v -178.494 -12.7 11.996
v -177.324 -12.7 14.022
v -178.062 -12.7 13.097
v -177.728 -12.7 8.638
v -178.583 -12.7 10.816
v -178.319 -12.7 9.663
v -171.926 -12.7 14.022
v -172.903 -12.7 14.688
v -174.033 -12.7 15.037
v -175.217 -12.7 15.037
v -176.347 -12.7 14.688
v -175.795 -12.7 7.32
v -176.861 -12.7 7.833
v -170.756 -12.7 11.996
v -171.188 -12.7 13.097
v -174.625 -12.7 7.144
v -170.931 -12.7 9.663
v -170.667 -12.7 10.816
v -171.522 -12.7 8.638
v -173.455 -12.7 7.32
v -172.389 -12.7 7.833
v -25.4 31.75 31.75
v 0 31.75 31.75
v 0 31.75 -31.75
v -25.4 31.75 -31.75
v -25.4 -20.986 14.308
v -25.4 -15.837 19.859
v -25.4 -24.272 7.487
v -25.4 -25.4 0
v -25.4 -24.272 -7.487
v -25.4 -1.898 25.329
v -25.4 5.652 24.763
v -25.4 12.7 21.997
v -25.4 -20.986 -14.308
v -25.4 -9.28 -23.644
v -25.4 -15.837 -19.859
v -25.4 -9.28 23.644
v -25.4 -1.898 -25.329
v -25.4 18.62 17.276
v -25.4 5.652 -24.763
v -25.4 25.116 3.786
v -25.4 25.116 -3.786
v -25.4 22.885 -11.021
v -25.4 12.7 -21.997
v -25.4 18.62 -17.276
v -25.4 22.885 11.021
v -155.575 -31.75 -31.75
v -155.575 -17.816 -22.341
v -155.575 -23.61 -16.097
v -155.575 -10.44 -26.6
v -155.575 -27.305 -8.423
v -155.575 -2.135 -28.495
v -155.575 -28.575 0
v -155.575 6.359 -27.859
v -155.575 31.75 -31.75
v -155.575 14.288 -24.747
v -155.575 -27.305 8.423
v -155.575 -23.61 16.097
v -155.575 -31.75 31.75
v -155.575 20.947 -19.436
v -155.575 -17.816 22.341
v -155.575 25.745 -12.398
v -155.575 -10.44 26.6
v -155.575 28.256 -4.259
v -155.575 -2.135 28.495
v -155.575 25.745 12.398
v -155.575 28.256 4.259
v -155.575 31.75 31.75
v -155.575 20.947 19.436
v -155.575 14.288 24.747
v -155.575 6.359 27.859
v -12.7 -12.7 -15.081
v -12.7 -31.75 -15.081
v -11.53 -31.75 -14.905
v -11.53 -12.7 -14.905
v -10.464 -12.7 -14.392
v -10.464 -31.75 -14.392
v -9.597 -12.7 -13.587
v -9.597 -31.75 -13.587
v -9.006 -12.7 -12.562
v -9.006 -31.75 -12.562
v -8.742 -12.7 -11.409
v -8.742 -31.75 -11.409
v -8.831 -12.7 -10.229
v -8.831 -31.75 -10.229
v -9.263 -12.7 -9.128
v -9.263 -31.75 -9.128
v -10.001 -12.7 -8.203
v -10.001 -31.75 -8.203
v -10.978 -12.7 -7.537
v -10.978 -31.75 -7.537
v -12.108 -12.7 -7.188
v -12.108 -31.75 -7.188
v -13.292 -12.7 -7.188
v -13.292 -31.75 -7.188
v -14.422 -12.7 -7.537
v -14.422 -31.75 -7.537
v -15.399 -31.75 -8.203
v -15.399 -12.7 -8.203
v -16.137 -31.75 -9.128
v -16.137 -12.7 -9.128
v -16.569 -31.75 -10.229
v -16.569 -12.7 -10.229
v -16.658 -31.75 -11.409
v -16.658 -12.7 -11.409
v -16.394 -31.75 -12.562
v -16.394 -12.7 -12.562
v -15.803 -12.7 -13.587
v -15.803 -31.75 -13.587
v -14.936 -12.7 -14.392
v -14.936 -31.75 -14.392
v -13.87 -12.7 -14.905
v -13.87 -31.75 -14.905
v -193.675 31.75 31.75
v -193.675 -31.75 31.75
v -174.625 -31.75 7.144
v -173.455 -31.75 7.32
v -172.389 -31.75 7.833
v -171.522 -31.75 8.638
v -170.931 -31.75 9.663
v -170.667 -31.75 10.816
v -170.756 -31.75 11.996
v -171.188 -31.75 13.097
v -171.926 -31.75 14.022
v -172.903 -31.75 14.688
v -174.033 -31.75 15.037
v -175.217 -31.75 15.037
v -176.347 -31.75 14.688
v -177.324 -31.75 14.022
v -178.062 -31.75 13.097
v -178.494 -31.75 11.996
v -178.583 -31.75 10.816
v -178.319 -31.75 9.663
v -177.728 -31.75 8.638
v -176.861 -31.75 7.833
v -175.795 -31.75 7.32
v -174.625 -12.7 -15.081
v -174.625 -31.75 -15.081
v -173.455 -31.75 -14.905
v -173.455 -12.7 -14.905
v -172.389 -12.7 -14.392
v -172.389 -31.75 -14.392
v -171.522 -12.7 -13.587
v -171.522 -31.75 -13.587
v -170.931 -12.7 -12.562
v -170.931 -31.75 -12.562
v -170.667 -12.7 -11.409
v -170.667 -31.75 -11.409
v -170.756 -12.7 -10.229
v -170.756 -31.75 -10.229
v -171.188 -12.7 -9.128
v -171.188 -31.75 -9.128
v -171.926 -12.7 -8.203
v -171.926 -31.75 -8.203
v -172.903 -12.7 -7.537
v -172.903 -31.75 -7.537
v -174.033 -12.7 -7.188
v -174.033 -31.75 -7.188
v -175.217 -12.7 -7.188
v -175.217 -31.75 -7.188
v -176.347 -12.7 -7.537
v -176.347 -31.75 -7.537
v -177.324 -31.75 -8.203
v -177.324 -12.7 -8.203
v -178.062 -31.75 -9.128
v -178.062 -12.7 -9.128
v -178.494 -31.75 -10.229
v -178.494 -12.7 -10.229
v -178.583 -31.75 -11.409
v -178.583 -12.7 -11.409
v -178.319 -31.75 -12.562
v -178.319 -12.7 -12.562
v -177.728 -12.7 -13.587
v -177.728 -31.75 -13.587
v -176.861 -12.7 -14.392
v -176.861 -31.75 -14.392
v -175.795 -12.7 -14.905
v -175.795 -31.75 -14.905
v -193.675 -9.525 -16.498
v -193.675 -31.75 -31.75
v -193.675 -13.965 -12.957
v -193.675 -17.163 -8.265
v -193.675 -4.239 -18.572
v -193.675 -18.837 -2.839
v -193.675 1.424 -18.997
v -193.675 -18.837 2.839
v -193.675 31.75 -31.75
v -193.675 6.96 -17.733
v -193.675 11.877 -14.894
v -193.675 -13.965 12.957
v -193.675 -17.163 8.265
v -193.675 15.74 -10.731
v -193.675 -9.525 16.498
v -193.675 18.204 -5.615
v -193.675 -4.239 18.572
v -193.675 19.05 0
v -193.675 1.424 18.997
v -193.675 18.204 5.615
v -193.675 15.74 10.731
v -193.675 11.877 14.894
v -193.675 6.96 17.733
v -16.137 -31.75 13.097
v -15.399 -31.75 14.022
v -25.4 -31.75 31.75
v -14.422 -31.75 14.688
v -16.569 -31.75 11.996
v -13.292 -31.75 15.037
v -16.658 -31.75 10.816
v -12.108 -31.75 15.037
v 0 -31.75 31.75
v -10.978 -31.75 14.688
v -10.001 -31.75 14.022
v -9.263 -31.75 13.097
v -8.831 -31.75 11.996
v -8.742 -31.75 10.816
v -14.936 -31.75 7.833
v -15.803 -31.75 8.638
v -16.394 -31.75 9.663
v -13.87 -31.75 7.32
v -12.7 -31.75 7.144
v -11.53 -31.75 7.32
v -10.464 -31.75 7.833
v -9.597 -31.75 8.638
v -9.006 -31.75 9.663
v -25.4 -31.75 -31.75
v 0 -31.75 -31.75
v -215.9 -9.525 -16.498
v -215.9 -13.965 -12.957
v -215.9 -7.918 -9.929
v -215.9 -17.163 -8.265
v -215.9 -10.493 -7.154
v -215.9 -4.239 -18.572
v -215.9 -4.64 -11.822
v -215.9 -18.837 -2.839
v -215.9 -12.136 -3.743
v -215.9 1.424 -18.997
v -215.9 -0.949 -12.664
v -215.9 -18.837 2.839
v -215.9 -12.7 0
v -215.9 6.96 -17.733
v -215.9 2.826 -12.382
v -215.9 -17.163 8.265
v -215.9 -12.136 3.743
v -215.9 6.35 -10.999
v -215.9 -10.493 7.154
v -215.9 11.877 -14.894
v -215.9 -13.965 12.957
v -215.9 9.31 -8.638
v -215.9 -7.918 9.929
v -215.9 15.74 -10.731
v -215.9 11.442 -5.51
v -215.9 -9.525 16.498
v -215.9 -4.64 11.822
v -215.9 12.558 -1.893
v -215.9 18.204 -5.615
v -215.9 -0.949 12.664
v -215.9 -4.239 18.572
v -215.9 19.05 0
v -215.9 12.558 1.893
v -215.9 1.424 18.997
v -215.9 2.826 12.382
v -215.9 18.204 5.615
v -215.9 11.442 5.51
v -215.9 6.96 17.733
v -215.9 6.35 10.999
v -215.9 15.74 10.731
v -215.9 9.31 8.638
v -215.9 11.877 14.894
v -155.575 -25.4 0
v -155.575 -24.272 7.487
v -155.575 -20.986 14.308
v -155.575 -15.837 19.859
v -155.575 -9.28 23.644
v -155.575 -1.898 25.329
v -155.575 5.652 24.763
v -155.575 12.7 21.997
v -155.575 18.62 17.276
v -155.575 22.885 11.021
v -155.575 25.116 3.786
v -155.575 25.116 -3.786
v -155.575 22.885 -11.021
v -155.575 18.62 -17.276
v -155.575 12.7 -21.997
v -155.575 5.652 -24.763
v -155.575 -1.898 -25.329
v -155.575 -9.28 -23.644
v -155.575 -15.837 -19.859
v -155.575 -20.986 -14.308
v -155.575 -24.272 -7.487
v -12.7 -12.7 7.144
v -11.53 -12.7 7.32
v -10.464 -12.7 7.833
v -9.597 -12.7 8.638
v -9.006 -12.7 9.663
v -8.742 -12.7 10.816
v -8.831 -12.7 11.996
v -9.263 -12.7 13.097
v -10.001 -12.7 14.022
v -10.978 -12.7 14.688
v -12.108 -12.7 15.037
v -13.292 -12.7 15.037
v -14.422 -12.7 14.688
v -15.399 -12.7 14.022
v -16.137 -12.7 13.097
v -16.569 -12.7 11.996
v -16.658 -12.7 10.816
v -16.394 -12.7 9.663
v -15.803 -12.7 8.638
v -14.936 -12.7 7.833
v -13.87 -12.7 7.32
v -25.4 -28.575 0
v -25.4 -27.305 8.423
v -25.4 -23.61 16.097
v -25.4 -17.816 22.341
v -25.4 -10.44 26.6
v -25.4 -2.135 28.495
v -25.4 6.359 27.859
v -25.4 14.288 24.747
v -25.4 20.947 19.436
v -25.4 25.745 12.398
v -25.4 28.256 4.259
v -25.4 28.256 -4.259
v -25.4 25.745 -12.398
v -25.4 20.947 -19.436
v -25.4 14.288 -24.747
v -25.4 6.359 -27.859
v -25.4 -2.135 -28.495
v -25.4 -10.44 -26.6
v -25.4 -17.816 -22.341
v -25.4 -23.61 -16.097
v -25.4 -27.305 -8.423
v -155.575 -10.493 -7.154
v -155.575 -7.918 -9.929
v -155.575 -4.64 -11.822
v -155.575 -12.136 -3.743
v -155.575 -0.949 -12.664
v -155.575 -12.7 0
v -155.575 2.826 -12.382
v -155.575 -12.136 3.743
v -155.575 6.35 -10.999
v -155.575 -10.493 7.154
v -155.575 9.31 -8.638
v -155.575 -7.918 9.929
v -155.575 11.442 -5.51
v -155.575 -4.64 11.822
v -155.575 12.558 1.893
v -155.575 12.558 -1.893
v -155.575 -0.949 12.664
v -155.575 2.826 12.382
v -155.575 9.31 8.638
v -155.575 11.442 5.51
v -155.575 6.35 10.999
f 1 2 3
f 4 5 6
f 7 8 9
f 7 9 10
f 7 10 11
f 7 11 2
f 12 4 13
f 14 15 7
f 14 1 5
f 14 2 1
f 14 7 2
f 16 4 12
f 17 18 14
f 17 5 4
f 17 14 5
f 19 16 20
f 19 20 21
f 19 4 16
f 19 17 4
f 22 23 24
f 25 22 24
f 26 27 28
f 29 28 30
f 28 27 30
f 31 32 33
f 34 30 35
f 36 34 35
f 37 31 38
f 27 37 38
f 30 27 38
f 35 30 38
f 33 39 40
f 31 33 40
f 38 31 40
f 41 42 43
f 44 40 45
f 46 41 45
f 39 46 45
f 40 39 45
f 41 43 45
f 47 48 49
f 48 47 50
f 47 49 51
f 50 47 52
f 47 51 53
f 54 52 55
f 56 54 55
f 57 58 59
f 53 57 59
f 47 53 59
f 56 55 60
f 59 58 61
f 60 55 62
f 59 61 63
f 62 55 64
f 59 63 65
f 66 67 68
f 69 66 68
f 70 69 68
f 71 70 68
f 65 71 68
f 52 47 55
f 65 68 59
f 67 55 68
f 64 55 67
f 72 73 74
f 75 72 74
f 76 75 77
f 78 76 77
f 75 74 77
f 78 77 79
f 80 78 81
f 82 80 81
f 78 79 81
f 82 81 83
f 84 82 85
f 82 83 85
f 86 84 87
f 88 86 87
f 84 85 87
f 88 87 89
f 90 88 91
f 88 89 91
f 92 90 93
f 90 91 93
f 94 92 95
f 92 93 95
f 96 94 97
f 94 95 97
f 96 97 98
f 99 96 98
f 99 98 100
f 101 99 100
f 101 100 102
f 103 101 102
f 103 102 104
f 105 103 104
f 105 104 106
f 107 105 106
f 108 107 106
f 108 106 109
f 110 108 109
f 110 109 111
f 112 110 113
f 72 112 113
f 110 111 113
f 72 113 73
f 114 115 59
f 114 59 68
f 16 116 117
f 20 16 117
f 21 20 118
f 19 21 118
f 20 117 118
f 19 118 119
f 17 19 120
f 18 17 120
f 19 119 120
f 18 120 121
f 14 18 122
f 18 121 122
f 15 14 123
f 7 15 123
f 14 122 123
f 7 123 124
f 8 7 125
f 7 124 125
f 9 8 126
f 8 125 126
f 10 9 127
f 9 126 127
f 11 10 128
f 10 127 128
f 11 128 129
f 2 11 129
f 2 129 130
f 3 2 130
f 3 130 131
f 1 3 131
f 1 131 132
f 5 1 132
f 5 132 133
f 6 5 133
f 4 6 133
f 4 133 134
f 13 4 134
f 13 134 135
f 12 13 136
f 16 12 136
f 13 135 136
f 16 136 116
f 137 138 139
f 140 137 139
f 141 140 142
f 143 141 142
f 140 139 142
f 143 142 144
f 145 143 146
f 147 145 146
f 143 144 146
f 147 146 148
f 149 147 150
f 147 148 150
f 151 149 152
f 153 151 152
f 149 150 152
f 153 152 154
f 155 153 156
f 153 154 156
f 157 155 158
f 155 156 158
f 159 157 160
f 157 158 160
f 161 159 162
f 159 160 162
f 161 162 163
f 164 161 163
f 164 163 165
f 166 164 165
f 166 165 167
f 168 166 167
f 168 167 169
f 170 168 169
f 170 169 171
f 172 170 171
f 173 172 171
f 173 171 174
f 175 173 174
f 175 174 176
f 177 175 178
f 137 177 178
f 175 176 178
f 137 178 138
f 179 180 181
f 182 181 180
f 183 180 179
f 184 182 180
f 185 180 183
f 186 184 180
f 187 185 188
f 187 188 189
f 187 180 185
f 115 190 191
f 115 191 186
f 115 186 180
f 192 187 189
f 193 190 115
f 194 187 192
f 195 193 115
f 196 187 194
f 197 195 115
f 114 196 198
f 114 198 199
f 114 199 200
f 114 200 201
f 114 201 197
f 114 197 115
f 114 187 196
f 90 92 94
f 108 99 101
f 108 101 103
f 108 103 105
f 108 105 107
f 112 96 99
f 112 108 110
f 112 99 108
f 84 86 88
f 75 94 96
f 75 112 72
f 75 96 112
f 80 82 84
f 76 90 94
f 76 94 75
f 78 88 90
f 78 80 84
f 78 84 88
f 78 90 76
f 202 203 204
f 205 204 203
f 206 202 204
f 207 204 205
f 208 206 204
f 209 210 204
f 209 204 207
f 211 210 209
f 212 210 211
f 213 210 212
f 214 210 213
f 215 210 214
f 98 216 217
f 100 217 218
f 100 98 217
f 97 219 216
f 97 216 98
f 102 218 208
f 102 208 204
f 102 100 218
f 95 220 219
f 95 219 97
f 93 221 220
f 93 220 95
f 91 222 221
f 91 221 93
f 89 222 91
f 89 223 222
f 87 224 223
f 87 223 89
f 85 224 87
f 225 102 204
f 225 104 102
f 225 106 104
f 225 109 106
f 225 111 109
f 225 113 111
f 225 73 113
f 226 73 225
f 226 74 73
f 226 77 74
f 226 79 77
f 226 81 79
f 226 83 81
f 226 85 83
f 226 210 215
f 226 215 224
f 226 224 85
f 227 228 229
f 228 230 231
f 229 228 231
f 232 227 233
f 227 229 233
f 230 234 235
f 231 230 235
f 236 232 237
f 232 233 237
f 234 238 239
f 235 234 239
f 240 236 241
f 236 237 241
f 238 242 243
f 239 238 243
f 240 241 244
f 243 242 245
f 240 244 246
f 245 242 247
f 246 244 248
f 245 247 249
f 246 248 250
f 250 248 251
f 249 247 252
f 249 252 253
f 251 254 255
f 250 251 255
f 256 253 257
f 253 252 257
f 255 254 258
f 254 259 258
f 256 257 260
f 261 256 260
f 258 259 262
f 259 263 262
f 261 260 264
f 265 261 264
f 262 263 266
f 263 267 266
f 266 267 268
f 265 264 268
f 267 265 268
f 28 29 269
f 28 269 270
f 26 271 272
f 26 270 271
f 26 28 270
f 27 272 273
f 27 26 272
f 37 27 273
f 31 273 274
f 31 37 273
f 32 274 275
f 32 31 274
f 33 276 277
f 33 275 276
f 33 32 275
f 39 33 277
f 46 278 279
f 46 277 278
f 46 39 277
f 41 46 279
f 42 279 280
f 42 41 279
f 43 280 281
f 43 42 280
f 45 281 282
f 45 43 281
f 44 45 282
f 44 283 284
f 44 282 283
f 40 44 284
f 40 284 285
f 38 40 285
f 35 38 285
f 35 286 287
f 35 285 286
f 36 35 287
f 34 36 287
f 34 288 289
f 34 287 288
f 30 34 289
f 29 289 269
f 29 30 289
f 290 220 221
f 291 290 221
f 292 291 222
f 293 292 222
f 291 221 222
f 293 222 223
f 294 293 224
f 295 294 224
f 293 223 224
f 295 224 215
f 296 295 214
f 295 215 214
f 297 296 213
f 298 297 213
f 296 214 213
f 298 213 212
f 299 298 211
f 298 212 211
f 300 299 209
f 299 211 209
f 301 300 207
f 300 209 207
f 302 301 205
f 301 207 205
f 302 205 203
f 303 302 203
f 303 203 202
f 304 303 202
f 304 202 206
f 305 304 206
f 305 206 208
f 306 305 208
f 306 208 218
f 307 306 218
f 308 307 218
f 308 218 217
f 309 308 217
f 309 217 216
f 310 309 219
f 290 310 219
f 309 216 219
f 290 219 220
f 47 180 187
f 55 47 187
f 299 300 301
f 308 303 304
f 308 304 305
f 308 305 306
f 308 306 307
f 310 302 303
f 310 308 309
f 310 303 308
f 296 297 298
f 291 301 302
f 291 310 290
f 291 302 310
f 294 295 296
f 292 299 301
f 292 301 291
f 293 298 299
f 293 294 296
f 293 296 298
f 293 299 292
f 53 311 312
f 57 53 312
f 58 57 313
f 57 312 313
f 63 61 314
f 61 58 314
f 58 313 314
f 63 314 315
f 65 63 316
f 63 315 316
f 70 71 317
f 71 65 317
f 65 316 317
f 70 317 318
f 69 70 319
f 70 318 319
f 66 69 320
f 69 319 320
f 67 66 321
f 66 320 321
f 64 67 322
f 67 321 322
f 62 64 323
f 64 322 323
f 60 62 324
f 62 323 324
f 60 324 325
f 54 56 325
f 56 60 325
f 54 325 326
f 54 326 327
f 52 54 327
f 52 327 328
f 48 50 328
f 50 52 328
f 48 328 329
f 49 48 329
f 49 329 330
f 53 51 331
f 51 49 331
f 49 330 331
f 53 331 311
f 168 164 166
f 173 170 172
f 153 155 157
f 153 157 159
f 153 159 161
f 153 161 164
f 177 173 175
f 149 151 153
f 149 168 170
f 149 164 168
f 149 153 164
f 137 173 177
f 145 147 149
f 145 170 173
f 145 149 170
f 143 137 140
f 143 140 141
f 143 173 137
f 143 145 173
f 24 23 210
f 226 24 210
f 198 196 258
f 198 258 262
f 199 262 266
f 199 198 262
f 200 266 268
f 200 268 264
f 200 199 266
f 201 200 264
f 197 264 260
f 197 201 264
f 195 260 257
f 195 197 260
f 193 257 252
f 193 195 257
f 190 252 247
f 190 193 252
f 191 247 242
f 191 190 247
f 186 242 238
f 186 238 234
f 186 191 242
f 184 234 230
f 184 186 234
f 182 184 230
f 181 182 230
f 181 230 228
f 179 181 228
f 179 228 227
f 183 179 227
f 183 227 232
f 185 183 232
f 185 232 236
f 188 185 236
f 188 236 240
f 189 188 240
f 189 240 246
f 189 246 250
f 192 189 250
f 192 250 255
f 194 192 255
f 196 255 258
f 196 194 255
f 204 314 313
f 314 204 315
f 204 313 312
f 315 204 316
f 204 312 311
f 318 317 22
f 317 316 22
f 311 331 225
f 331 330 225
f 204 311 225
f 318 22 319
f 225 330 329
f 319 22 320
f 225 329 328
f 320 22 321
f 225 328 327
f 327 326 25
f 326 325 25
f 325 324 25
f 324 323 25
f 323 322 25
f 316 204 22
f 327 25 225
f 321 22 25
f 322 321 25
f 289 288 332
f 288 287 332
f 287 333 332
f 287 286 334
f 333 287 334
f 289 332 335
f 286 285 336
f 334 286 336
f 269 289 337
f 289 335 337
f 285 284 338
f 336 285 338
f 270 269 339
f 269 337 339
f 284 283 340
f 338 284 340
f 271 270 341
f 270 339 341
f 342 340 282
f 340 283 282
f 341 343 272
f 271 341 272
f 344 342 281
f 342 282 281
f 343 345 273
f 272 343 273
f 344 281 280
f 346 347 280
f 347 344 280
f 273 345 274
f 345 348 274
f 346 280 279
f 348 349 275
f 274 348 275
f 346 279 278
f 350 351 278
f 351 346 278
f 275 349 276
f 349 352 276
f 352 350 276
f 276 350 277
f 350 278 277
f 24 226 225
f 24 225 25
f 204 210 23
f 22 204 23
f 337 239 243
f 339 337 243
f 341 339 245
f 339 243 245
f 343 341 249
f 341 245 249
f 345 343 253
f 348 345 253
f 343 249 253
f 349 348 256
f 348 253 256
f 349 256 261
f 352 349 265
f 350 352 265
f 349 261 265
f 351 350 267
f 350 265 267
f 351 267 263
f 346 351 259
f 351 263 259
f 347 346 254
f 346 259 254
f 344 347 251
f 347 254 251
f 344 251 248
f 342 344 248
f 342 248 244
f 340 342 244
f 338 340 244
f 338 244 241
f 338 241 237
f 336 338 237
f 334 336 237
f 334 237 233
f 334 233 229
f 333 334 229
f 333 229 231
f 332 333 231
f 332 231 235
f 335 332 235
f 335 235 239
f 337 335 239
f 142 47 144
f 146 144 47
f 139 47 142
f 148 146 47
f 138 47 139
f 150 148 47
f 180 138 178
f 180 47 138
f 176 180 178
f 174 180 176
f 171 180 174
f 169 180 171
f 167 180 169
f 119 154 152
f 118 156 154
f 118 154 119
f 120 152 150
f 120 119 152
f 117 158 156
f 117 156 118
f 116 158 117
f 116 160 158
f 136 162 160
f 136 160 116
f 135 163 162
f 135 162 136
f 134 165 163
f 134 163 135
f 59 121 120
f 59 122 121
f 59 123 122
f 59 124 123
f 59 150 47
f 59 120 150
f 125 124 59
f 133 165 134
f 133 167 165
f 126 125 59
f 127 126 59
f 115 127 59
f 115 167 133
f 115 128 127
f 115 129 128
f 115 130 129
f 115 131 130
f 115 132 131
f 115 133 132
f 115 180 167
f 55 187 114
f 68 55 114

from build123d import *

# Parameters (mm, degrees)
SKETCH1_W                   = 63.5
SKETCH1_H                   = 63.5
BASE_EXTRUDE_DEPTH          = 25.4
SKETCH2_R                   = 28.575
SKETCH2_R_2                 = 25.4
BORE_DEPTH                  = 193.675
SKETCH3_W                   = 63.5
SKETCH3_H                   = 63.5
BOSS_EXTRUDE2_DEPTH         = 38.1
SKETCH4_R                   = 19.05
BOSS_EXTRUDE3_DEPTH         = 22.225
CUT_EXTRUDE1_REACH          = 222.52
SKETCH5_R                   = 12.7
SKETCH6_R                   = 3.96875
TAPPED_BASE_HOLES_MS4_DEPTH = 19.05


with BuildPart() as part:
    # Sketch1 → Base-Extrude (new body)
    with BuildSketch(Plane(origin=(0, 0, 0), x_dir=(0, 0, -1), z_dir=(1, 0, 0))):
        Rectangle(SKETCH1_W, SKETCH1_H)
    extrude(amount=-BASE_EXTRUDE_DEPTH)

    # Sketch2 → BORE (add)
    with BuildSketch(Plane.ZY):
        with Locations(Location((0, 0, 0), (0, 0, 270))):
            Circle(SKETCH2_R)
        with Locations(Location((0, 0, 0), (0, 0, 270))):
            Circle(SKETCH2_R_2, mode=Mode.SUBTRACT)
    extrude(amount=BORE_DEPTH)

    # Sketch3 → Boss-Extrude2 (add)
    with BuildSketch(Plane.ZY.offset(193.675)):
        Rectangle(SKETCH3_W, SKETCH3_H)
    extrude(amount=-BOSS_EXTRUDE2_DEPTH)

    # Sketch4 → Boss-Extrude3 (add)
    with BuildSketch(Plane(origin=(-193.675, 0, 0), x_dir=(0, 0, -1), z_dir=(1, 0, 0))):
        with Locations(Location((0, 0, 0), (0, 0, 90))):
            Circle(SKETCH4_R)
    extrude(amount=-BOSS_EXTRUDE3_DEPTH)

    # Sketch5 → Cut-Extrude1 (cut, up to next)
    with BuildSketch(Plane.ZY.offset(215.9), mode=Mode.PRIVATE) as cut_extrude1_sk1:
        with Locations(Location((0, 0, 0), (0, 0, 270))):
            Circle(SKETCH5_R)
    cut_extrude1_tool1 = extrude(cut_extrude1_sk1.sketch, amount=-CUT_EXTRUDE1_REACH, mode=Mode.PRIVATE) & part.part
    add(cut_extrude1_tool1.solids().sort_by_distance((-215.9, 0, 0))[0], mode=Mode.SUBTRACT)

    # Sketch6 → TAPPED BASE HOLES - MS4 (cut)
    with BuildSketch(Plane(origin=(148.541814714, -31.75, 0.813855987), x_dir=(1, 0, 0), z_dir=(0, -1, 0))):
        with Locations(Location((-161.241814714, 10.298644013, 0), (0, 0, 270))):
            Circle(SKETCH6_R)
        with Locations(Location((-161.241814714, -11.926355987, 0), (0, 0, 270))):
            Circle(SKETCH6_R)
        with Locations(Location((-323.166814714, -11.926355987, 0), (0, 0, 270))):
            Circle(SKETCH6_R)
        with Locations(Location((-323.166814714, 10.298644013, 0), (0, 0, 270))):
            Circle(SKETCH6_R)
    extrude(amount=-TAPPED_BASE_HOLES_MS4_DEPTH, mode=Mode.SUBTRACT)


solid = part.part
